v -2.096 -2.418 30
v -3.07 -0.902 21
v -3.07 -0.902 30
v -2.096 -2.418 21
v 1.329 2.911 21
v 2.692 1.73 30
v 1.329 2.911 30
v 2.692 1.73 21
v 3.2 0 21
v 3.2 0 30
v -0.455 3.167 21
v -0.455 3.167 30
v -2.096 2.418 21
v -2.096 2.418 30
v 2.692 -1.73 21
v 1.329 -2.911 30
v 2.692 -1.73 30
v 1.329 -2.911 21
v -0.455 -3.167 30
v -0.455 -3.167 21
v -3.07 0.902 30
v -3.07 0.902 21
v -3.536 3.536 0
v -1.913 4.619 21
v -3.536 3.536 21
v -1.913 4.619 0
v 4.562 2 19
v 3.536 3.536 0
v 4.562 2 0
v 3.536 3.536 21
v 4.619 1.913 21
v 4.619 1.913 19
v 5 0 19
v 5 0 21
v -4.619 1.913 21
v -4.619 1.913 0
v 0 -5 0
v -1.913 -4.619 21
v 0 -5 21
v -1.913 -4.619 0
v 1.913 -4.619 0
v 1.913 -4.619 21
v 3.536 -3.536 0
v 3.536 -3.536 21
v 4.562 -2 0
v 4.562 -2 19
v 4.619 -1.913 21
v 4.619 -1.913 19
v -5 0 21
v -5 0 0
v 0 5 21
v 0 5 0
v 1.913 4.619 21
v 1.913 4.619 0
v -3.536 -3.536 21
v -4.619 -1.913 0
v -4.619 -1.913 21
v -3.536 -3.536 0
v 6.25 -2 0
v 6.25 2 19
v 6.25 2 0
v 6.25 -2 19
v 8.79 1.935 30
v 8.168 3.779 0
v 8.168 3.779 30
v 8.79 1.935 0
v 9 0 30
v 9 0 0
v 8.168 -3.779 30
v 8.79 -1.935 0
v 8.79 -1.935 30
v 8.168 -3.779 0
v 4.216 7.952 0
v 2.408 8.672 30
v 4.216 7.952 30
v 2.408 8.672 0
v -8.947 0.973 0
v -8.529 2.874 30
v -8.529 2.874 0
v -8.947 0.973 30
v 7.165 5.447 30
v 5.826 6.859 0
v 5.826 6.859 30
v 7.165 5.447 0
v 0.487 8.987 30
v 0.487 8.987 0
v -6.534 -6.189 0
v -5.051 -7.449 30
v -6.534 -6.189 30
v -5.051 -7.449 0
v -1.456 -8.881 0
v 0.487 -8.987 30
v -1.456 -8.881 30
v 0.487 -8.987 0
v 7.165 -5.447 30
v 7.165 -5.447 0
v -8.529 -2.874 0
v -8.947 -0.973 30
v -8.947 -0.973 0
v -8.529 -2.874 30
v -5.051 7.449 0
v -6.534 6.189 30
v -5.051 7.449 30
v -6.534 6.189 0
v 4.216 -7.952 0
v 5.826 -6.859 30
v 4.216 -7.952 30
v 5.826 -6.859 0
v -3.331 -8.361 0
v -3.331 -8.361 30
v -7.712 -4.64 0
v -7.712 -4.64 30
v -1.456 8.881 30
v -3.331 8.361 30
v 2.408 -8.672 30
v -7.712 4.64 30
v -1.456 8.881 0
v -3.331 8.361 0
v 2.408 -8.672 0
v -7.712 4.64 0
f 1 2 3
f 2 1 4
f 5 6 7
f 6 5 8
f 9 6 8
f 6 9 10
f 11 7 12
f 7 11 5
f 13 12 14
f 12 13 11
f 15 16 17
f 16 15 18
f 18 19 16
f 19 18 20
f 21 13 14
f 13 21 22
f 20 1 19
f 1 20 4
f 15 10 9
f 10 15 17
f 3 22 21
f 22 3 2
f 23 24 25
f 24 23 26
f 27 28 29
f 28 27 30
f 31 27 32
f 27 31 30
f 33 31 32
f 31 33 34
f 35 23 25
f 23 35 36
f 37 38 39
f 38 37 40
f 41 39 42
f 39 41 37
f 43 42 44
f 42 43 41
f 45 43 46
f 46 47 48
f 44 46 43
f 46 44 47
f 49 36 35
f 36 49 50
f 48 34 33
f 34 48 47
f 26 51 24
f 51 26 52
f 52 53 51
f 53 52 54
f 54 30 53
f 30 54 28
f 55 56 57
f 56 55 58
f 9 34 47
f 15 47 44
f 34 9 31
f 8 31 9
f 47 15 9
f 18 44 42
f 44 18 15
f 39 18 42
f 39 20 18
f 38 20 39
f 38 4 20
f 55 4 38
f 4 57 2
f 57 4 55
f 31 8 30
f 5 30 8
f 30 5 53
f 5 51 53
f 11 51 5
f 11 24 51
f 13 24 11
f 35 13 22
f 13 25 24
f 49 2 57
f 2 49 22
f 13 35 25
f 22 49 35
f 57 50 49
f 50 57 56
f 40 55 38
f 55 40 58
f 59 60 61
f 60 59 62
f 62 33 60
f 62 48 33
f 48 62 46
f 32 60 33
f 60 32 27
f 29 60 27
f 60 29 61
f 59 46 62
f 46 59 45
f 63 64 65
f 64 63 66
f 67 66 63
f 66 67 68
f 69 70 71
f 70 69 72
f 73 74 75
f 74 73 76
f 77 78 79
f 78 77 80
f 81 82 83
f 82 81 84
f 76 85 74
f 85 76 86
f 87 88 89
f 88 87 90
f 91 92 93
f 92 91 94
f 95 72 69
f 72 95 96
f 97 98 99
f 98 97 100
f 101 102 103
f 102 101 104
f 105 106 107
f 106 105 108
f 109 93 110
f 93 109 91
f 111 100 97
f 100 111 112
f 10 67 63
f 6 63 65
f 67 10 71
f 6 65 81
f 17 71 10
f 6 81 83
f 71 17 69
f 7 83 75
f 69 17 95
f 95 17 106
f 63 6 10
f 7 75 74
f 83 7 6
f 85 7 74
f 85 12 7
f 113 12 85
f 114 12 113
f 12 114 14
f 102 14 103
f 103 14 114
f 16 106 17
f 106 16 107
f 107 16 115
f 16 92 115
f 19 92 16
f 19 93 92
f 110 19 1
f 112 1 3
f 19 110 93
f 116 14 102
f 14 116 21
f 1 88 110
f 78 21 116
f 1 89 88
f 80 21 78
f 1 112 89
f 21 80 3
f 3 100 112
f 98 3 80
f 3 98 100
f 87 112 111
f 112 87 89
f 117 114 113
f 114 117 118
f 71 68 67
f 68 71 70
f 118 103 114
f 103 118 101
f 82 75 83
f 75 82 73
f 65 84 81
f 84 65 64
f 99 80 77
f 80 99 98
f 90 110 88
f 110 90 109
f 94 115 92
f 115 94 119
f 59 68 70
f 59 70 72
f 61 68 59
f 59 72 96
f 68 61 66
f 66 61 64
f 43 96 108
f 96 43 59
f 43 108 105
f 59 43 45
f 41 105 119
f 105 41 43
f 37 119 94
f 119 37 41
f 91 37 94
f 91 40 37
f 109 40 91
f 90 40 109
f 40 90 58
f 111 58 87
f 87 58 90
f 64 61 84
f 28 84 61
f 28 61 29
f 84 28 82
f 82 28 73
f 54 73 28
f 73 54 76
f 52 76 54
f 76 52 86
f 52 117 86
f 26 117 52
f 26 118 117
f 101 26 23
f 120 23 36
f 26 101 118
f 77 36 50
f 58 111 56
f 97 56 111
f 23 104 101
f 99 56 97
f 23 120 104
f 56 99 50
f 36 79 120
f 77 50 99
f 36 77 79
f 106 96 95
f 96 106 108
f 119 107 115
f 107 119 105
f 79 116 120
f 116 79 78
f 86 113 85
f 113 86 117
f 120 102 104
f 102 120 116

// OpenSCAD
stepperShaftDiameter = 6.4;
stepperShaftLength = 10;
routerShaftDiameter = 10;
routerShaftLength = 20;
outerDiameter = 18;
		  
difference() {
    cylinder(r = outerDiameter / 2, h = stepperShaftLength + routerShaftLength);
    translate([0, 0, -1])
        union() {
            cylinder(r = stepperShaftDiameter / 2, h = 2 + stepperShaftLength + routerShaftLength);
            cylinder(r = routerShaftDiameter / 2, h = 2 + routerShaftLength);
            translate([routerShaftDiameter / 2 - 2.5/2, -4/2, 0])
                cube([2.5, 4, routerShaftLength]);
	}
}
